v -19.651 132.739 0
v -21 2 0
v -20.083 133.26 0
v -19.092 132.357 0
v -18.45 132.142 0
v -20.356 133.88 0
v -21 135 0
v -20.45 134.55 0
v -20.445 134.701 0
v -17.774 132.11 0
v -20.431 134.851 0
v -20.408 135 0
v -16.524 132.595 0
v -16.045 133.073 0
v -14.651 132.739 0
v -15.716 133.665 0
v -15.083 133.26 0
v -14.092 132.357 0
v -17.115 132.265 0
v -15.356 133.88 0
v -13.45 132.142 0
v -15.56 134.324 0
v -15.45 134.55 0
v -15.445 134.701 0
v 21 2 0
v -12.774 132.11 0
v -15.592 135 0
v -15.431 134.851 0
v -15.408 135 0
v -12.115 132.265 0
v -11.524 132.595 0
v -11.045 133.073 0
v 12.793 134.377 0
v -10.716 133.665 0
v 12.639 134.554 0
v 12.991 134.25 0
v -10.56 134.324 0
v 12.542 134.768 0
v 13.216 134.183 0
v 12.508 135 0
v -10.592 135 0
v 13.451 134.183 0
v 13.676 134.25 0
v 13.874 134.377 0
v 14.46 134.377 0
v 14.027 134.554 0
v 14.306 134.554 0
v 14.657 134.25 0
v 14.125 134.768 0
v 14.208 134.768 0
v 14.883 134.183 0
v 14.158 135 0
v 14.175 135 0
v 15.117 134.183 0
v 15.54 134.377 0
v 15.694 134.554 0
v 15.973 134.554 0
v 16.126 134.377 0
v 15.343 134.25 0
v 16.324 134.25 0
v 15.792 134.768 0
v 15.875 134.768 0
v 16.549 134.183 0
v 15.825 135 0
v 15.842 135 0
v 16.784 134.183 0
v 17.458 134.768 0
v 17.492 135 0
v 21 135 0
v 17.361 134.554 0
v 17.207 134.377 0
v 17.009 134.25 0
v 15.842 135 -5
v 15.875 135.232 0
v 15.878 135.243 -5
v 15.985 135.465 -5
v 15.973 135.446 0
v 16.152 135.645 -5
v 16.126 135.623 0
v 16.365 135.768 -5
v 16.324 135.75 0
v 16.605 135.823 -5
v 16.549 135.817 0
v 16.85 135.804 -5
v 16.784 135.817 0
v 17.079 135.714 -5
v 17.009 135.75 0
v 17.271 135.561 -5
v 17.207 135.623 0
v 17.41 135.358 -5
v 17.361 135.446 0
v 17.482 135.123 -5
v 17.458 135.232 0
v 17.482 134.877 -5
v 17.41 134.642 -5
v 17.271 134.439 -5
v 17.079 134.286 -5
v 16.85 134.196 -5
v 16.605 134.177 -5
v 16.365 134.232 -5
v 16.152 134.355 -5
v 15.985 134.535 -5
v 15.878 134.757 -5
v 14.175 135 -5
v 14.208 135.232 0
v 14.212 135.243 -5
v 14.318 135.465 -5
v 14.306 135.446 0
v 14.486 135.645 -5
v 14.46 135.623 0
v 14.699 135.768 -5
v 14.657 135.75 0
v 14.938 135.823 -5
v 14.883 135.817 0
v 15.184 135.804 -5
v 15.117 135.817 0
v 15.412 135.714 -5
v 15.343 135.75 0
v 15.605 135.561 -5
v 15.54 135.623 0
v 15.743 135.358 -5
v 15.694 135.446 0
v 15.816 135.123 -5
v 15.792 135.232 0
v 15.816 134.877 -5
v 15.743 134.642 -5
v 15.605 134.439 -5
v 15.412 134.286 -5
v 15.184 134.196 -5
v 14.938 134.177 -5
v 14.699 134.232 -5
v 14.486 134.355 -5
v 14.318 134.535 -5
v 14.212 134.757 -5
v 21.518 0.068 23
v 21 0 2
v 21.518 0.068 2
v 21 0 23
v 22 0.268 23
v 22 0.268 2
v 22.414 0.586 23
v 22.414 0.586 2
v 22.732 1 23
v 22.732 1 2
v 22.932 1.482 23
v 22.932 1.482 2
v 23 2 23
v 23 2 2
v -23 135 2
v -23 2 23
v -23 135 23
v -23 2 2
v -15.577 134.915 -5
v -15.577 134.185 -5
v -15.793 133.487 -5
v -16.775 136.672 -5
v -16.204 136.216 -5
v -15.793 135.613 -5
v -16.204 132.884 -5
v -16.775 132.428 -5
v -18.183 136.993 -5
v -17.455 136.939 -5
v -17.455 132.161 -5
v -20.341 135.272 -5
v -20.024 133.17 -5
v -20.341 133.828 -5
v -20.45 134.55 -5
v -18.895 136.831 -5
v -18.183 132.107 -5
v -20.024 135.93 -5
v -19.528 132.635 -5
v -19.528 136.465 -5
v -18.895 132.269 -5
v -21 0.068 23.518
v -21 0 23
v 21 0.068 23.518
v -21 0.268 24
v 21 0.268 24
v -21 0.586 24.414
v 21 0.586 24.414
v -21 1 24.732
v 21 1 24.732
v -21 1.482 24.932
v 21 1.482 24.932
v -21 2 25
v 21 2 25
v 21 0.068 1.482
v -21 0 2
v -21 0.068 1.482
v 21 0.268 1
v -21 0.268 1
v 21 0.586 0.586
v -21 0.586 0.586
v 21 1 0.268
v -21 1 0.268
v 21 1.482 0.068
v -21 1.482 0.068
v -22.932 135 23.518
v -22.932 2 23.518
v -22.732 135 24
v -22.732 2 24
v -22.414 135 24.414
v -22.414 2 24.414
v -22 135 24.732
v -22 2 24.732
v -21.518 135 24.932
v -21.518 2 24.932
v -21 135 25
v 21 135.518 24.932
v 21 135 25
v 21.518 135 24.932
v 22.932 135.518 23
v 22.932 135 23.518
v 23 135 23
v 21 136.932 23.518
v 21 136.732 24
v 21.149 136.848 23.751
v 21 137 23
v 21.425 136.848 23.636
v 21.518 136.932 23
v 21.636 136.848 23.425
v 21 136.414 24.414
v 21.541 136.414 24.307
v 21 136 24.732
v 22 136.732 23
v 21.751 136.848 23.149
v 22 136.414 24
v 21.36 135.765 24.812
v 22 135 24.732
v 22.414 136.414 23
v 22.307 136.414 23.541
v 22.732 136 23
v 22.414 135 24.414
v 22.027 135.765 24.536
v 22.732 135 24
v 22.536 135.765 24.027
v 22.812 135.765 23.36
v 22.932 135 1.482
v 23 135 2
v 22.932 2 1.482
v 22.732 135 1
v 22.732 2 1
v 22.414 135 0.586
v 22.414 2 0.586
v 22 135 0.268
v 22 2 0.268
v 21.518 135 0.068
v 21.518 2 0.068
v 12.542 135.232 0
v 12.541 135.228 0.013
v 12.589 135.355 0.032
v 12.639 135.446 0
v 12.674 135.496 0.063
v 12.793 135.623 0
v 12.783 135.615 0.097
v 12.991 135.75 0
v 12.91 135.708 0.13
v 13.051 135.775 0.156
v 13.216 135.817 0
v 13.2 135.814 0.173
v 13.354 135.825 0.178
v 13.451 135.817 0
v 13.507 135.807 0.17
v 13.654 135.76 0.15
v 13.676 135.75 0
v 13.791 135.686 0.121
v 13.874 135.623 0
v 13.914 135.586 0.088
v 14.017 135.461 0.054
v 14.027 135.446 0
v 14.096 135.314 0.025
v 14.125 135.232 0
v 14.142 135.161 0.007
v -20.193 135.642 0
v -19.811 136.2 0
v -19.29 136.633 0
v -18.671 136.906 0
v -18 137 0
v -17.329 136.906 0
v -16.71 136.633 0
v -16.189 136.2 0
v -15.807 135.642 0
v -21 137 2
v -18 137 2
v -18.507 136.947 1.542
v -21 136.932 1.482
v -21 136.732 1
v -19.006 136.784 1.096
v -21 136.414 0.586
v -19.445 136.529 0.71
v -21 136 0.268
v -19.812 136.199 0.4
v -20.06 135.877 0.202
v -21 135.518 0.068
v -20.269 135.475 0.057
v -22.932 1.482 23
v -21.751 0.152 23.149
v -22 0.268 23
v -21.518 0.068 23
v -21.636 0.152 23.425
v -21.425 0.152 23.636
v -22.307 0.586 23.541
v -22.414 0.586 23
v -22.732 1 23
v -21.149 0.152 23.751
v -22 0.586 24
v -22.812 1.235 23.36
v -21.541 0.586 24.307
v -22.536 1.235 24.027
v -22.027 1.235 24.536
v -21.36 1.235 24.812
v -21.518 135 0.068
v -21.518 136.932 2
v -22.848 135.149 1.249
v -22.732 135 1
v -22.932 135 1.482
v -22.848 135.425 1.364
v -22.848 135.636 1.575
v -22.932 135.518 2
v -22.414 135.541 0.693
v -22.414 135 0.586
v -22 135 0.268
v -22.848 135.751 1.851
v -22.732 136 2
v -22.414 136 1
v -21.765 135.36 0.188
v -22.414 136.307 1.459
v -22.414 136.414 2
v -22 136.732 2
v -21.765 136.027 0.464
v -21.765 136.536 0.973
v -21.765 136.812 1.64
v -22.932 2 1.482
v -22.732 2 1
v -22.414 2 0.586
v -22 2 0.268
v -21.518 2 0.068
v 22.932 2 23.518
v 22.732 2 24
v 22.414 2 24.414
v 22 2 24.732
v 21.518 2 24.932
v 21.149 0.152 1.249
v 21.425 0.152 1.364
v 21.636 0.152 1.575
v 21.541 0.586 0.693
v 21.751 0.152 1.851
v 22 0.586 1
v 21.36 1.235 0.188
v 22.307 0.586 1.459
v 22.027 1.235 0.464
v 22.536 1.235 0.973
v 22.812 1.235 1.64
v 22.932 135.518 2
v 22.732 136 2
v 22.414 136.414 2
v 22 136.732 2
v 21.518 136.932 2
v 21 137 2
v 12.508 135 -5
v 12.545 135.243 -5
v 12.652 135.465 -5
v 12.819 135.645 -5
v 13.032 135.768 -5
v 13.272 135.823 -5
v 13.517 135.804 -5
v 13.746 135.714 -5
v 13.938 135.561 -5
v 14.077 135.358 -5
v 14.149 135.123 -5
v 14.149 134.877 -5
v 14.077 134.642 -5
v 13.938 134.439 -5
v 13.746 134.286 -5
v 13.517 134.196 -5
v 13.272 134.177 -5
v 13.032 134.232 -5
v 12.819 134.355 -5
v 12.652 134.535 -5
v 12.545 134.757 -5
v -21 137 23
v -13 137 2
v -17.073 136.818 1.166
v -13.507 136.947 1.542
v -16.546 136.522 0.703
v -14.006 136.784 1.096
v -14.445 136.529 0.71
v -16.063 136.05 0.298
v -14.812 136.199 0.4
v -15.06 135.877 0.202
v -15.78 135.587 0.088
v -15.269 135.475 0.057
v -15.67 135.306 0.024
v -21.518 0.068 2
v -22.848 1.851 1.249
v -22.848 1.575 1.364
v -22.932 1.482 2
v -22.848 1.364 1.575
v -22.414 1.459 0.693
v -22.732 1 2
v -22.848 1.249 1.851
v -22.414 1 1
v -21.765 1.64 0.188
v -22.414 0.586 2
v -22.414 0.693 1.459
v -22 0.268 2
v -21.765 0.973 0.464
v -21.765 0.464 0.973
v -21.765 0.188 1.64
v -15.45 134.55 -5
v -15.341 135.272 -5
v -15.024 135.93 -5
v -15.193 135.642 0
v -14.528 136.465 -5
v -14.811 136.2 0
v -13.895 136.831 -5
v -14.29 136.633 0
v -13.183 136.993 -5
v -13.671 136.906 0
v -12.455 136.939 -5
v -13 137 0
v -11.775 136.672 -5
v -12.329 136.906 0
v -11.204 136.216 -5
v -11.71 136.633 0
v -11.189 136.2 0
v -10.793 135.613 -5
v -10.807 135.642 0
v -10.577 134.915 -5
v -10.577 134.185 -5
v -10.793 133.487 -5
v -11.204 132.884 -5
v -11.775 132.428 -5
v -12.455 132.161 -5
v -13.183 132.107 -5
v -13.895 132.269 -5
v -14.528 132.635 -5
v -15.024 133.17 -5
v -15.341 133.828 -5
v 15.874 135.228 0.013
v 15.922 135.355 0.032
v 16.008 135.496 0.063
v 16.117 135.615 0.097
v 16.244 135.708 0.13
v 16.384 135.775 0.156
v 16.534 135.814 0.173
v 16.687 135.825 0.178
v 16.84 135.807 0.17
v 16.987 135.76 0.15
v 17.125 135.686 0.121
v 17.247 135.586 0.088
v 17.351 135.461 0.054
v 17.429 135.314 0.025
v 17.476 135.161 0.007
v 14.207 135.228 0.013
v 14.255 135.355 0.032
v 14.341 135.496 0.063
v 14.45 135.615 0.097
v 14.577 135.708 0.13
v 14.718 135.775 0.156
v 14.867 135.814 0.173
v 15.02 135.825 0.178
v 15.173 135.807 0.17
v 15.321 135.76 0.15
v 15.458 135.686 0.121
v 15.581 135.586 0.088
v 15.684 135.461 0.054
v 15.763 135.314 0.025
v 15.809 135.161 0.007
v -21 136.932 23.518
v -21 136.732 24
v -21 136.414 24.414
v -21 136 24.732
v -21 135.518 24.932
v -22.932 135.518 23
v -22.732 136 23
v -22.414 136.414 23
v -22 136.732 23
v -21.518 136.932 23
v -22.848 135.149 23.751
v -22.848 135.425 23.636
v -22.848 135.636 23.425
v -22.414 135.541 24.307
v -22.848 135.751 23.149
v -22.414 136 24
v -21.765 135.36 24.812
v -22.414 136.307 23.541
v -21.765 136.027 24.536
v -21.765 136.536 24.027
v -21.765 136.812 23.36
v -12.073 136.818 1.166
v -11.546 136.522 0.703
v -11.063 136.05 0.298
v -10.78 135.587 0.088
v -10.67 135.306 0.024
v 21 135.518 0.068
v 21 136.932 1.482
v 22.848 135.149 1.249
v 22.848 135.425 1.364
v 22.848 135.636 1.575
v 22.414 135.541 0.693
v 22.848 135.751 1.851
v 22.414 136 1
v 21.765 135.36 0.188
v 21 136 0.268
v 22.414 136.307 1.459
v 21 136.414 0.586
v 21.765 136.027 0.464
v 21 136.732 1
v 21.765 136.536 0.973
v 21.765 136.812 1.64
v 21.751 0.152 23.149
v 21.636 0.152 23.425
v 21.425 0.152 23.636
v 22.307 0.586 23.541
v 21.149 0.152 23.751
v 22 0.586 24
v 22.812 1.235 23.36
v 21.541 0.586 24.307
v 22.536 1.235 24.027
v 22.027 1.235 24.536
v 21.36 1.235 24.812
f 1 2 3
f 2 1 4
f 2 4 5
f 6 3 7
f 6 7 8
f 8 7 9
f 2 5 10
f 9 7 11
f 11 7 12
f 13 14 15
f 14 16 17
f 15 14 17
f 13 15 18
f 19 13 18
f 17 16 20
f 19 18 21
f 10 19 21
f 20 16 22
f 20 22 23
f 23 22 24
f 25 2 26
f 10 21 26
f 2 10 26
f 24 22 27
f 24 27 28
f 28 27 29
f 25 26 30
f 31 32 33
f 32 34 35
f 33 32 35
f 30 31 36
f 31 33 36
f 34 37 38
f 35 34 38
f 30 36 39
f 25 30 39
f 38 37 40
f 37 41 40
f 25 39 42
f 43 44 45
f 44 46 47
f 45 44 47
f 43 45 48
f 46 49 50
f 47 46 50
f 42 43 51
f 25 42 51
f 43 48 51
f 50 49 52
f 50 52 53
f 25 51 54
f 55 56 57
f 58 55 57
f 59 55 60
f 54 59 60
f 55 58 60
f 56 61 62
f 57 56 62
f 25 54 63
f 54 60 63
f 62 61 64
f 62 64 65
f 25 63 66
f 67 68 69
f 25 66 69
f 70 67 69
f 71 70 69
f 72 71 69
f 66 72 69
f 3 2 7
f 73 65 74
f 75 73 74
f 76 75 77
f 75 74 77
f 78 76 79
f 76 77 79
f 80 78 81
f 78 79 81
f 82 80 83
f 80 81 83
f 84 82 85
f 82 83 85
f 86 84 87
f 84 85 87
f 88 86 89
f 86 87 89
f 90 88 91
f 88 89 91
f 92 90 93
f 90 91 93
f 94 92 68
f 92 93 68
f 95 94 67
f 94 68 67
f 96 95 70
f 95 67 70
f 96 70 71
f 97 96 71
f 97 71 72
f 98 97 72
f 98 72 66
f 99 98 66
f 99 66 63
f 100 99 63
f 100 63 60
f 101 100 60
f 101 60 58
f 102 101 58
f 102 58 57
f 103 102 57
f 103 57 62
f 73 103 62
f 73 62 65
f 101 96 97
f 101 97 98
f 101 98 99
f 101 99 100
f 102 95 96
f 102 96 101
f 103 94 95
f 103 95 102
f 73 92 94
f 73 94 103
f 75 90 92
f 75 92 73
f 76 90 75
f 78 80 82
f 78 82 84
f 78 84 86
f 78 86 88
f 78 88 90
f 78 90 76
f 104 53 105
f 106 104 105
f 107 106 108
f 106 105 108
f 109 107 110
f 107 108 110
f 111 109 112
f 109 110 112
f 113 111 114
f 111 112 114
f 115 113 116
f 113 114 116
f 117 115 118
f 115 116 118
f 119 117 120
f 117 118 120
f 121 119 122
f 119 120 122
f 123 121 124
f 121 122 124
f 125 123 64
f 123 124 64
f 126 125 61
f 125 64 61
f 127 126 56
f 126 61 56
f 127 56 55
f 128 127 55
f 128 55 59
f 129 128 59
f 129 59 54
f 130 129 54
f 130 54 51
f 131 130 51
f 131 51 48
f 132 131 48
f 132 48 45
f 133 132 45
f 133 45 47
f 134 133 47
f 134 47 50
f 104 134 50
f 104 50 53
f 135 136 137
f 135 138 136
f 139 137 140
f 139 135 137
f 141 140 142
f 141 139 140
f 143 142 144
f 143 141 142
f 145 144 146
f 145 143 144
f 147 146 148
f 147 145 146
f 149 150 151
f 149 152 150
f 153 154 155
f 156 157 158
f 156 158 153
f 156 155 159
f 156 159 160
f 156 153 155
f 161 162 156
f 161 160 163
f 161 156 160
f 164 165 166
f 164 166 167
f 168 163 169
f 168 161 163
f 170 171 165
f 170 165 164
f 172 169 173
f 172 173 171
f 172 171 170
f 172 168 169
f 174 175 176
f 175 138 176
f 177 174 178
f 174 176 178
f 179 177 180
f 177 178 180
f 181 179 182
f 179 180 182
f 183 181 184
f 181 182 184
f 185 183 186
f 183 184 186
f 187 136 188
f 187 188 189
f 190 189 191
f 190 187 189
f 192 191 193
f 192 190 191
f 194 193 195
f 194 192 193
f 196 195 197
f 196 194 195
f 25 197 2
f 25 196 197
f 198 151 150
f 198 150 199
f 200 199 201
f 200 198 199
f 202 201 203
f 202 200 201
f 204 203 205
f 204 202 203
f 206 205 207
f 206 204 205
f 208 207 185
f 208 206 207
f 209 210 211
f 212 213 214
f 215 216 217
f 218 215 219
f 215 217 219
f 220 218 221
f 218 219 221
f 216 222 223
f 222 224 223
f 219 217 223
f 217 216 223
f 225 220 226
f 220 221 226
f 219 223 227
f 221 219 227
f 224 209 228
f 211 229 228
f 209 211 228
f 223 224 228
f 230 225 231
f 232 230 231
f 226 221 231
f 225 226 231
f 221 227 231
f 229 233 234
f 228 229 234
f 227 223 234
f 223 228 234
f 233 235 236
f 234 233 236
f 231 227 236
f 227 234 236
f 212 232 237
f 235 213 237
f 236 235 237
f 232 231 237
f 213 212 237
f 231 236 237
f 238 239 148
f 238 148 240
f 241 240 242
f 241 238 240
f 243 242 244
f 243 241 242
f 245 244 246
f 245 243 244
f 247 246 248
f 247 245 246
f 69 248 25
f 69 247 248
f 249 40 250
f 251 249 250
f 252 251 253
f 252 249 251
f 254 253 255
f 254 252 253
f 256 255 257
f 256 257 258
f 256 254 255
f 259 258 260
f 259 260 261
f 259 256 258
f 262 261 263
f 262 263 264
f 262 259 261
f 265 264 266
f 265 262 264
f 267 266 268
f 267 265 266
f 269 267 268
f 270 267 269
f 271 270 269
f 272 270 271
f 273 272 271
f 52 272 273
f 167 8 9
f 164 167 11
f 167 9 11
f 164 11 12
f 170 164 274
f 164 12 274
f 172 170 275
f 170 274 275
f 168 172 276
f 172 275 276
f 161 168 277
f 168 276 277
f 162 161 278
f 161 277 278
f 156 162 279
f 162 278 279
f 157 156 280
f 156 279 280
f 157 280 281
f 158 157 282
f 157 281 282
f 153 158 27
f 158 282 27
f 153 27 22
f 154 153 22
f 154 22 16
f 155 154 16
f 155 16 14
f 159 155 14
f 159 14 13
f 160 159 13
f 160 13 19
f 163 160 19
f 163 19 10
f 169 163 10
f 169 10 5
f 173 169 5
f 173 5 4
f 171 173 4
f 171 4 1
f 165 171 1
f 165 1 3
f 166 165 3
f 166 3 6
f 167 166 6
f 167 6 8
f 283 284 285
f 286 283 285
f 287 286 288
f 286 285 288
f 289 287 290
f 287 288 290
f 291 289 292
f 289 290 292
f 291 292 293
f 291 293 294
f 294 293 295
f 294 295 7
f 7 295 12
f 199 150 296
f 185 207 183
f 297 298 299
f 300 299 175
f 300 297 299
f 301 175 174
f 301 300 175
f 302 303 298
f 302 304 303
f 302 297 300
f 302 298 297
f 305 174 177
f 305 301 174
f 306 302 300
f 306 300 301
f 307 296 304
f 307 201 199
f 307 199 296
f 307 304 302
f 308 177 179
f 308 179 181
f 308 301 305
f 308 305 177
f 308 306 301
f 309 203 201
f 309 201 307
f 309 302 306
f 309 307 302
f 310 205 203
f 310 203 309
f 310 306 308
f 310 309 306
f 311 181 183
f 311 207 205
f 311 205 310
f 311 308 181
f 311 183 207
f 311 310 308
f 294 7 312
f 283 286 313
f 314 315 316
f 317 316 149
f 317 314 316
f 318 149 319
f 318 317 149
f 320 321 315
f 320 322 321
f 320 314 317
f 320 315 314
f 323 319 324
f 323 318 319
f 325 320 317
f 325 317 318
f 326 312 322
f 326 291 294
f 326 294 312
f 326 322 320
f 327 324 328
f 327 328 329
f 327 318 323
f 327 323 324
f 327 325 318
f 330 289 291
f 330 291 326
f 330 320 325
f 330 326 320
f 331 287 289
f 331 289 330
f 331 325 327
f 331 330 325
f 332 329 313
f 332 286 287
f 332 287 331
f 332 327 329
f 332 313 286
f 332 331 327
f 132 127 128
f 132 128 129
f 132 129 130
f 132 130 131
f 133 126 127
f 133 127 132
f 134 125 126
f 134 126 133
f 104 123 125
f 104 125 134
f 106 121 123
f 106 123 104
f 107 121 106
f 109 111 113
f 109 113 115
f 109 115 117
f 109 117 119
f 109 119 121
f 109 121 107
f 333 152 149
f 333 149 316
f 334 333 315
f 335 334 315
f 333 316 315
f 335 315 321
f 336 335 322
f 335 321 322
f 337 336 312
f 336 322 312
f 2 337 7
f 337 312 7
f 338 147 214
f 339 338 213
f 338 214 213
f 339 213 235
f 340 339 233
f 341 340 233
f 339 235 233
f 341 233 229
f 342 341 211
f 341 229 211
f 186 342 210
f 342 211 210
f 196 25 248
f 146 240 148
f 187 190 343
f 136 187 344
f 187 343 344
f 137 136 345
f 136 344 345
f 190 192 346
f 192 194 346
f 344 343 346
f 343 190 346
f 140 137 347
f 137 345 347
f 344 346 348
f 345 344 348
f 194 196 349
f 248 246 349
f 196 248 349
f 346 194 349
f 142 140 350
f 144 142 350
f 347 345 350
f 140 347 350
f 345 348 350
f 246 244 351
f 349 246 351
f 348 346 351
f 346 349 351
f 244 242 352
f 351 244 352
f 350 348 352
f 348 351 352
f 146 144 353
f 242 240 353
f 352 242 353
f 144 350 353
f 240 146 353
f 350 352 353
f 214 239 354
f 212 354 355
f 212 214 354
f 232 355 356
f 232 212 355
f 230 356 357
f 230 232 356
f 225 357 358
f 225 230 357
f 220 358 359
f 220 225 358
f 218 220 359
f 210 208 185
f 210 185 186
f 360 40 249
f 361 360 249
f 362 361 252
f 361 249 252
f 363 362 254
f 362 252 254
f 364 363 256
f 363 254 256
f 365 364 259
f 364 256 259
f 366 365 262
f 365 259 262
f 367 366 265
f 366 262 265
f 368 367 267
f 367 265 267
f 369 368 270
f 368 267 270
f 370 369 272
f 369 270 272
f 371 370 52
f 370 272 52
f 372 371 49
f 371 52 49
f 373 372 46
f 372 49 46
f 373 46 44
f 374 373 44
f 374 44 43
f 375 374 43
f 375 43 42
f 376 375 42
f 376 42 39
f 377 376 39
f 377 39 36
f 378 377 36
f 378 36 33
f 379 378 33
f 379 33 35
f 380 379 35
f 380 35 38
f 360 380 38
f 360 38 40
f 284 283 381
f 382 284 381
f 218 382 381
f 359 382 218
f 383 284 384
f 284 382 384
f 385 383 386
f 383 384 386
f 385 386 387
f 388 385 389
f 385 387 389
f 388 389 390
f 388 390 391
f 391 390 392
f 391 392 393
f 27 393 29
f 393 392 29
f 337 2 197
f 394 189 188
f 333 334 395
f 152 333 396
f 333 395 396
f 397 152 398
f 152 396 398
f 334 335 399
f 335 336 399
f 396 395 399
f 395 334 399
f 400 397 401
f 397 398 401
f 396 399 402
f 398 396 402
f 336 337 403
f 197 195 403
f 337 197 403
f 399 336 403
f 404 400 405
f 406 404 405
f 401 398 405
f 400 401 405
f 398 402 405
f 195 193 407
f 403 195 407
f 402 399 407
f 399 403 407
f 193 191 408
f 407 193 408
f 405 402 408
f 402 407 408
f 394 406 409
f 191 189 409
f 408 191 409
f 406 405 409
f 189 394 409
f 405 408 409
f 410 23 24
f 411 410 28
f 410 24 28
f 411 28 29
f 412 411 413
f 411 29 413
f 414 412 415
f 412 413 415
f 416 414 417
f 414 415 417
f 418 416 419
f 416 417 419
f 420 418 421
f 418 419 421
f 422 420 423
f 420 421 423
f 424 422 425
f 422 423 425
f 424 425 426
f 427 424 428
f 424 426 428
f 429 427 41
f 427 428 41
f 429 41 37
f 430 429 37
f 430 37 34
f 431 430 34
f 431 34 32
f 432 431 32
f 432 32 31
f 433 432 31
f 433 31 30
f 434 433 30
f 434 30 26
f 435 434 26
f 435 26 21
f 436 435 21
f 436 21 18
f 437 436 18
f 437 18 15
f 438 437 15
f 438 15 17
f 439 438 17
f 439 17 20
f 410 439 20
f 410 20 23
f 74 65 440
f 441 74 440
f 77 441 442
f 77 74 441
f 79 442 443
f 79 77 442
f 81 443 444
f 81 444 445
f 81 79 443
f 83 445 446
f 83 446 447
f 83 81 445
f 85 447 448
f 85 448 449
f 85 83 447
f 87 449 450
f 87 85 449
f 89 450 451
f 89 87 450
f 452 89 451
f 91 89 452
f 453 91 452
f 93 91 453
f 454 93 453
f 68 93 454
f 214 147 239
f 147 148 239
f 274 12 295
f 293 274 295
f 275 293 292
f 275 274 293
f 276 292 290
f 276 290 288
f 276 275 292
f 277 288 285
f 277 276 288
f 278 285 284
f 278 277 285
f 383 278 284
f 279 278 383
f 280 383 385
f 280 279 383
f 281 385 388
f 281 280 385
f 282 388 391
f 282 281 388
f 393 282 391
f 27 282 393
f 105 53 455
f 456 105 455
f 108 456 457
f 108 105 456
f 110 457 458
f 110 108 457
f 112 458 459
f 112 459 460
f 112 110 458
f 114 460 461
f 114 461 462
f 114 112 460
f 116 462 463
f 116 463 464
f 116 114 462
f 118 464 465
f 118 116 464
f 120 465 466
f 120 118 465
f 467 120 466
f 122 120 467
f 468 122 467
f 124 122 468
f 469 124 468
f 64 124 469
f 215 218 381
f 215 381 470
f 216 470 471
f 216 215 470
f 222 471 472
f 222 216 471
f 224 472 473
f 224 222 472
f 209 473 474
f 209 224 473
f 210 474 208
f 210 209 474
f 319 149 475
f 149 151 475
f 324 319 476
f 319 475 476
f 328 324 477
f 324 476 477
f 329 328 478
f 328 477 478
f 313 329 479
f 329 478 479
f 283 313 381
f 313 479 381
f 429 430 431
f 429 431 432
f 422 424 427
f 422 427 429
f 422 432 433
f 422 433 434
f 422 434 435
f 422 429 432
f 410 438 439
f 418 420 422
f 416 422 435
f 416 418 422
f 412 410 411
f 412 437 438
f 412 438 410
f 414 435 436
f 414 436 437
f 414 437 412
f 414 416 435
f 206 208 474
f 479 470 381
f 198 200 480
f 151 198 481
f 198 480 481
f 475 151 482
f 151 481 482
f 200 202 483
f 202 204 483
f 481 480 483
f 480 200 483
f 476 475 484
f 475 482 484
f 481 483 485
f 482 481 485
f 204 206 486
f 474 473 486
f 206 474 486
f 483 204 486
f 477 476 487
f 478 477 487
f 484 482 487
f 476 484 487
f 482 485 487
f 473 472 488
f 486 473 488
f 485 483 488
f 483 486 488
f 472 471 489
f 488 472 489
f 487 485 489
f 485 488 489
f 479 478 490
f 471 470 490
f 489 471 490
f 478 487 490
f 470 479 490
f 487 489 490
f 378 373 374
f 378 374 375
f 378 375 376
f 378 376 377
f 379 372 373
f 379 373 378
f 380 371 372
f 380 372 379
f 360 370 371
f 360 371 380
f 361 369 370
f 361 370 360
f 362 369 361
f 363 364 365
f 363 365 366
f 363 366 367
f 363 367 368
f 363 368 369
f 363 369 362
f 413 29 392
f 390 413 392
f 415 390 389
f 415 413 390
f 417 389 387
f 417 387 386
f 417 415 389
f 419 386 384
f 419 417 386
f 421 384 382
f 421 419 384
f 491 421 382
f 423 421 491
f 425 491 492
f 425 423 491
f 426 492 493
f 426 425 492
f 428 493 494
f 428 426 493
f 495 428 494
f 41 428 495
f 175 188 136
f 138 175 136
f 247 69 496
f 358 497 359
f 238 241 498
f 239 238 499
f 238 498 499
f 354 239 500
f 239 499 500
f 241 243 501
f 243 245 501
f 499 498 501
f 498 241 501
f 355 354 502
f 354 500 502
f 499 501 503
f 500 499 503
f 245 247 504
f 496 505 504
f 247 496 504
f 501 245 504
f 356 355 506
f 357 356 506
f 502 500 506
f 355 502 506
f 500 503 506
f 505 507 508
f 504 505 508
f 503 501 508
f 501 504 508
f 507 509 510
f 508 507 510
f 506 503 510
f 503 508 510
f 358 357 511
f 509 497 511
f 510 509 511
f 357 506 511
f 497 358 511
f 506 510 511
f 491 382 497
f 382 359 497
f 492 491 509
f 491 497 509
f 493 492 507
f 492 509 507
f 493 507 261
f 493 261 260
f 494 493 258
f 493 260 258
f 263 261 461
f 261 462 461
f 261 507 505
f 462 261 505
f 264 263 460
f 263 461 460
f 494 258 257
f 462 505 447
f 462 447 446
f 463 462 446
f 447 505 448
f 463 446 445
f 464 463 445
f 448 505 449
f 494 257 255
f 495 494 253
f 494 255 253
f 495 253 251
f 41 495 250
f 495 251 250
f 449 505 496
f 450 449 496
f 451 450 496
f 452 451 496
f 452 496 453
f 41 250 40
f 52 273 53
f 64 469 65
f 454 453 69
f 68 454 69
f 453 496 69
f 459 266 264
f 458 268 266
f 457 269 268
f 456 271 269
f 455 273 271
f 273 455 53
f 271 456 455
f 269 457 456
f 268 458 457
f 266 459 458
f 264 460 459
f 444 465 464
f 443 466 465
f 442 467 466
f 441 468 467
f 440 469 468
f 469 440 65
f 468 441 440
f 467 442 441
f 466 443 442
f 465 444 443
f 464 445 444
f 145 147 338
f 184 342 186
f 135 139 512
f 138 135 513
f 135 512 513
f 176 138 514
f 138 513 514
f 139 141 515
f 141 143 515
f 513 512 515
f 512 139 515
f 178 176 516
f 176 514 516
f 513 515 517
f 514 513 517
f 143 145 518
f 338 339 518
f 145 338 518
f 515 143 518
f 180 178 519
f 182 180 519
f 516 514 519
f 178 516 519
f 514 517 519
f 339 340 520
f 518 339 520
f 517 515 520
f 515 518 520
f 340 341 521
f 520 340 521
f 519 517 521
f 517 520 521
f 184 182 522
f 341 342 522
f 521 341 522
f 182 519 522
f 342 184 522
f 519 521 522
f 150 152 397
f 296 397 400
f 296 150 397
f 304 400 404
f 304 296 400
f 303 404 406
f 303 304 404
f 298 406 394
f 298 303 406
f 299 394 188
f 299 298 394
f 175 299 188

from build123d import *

# Parameters (mm, degrees)
SKETCH1_W                       = 46
SKETCH1_H                       = 137
BOSS_EXTRUDE1_DEPTH             = 25
FILLET1_R                       = 2
SKETCH2_R                       = 0.825
SKETCH2_R_2                     = 2.45
BOSS_EXTRUDE4_DEPTH             = 5
BOSS_EXTRUDE4_DIRECTION_2_REACH = 143.149


with BuildPart() as part:
    # Sketch1 → Boss-Extrude1 (new body)
    with BuildSketch(Plane.XY):
        with Locations((0, 68.5)):
            Rectangle(SKETCH1_W, SKETCH1_H)
    extrude(amount=BOSS_EXTRUDE1_DEPTH)

    # Fillet1
    fillet1_edges = [part.edges().sort_by_distance(p)[0] for p in [
        (23, 68.5, 25),
        (0, 137, 25),
        (-23, 68.5, 25),
        (0, 137, 0),
        (23, 68.5, 0),
        (0, 0, 0),
        (-23, 68.5, 0),
        (-23, 137, 12.5),
        (23, 137, 12.5),
        (23, 0, 12.5),
        (-23, 0, 12.5),
        (0, 0, 25),
    ]]
    fillet(fillet1_edges, radius=FILLET1_R)

    # Sketch2 → Boss-Extrude4 (add)
    with BuildSketch(Plane(origin=(0, 0, 0), x_dir=(-1, 0, 0), z_dir=(0, 0, -1))):
        with Locations((-16.666666667, 135)):
            Circle(SKETCH2_R)
        with Locations((-15, 135)):
            Circle(SKETCH2_R)
        with Locations((-13.333333333, 135)):
            Circle(SKETCH2_R)
        with Locations((13, 134.55)):
            Circle(SKETCH2_R_2)
        with Locations((18, 134.55)):
            Circle(SKETCH2_R_2)
    extrude(amount=BOSS_EXTRUDE4_DEPTH)

    # Sketch2 → Boss-Extrude4 direction 2 (add, up to next)
    with BuildSketch(Plane(origin=(0, 0, 0), x_dir=(-1, 0, 0), z_dir=(0, 0, -1)), mode=Mode.PRIVATE) as boss_extrude4_direction_2_sk1:
        with Locations((-16.666666667, 135)):
            Circle(SKETCH2_R)
    boss_extrude4_direction_2_tool1 = extrude(boss_extrude4_direction_2_sk1.sketch, amount=-BOSS_EXTRUDE4_DIRECTION_2_REACH, mode=Mode.PRIVATE) - part.part
    # Sketch2 → Boss-Extrude4 direction 2 (add, up to next)
    with BuildSketch(Plane(origin=(0, 0, 0), x_dir=(-1, 0, 0), z_dir=(0, 0, -1)), mode=Mode.PRIVATE) as boss_extrude4_direction_2_sk2:
        with Locations((-15, 135)):
            Circle(SKETCH2_R)
    boss_extrude4_direction_2_tool2 = extrude(boss_extrude4_direction_2_sk2.sketch, amount=-BOSS_EXTRUDE4_DIRECTION_2_REACH, mode=Mode.PRIVATE) - part.part
    # Sketch2 → Boss-Extrude4 direction 2 (add, up to next)
    with BuildSketch(Plane(origin=(0, 0, 0), x_dir=(-1, 0, 0), z_dir=(0, 0, -1)), mode=Mode.PRIVATE) as boss_extrude4_direction_2_sk3:
        with Locations((-13.333333333, 135)):
            Circle(SKETCH2_R)
    boss_extrude4_direction_2_tool3 = extrude(boss_extrude4_direction_2_sk3.sketch, amount=-BOSS_EXTRUDE4_DIRECTION_2_REACH, mode=Mode.PRIVATE) - part.part
    # Sketch2 → Boss-Extrude4 direction 2 (add, up to next)
    with BuildSketch(Plane(origin=(0, 0, 0), x_dir=(-1, 0, 0), z_dir=(0, 0, -1)), mode=Mode.PRIVATE) as boss_extrude4_direction_2_sk4:
        with Locations((13, 134.55)):
            Circle(SKETCH2_R_2)
    boss_extrude4_direction_2_tool4 = extrude(boss_extrude4_direction_2_sk4.sketch, amount=-BOSS_EXTRUDE4_DIRECTION_2_REACH, mode=Mode.PRIVATE) - part.part
    # Sketch2 → Boss-Extrude4 direction 2 (add, up to next)
    with BuildSketch(Plane(origin=(0, 0, 0), x_dir=(-1, 0, 0), z_dir=(0, 0, -1)), mode=Mode.PRIVATE) as boss_extrude4_direction_2_sk5:
        with Locations((18, 134.55)):
            Circle(SKETCH2_R_2)
    boss_extrude4_direction_2_tool5 = extrude(boss_extrude4_direction_2_sk5.sketch, amount=-BOSS_EXTRUDE4_DIRECTION_2_REACH, mode=Mode.PRIVATE) - part.part
    add(boss_extrude4_direction_2_tool1.solids().sort_by_distance((16.666667, 135, 0))[0])
    add(boss_extrude4_direction_2_tool2.solids().sort_by_distance((15, 135, 0))[0])
    add(boss_extrude4_direction_2_tool3.solids().sort_by_distance((13.333333, 135, 0))[0])
    add(boss_extrude4_direction_2_tool4.solids().sort_by_distance((-13, 134.55, 0))[0])
    add(boss_extrude4_direction_2_tool5.solids().sort_by_distance((-18, 134.55, 0))[0])


solid = part.part
